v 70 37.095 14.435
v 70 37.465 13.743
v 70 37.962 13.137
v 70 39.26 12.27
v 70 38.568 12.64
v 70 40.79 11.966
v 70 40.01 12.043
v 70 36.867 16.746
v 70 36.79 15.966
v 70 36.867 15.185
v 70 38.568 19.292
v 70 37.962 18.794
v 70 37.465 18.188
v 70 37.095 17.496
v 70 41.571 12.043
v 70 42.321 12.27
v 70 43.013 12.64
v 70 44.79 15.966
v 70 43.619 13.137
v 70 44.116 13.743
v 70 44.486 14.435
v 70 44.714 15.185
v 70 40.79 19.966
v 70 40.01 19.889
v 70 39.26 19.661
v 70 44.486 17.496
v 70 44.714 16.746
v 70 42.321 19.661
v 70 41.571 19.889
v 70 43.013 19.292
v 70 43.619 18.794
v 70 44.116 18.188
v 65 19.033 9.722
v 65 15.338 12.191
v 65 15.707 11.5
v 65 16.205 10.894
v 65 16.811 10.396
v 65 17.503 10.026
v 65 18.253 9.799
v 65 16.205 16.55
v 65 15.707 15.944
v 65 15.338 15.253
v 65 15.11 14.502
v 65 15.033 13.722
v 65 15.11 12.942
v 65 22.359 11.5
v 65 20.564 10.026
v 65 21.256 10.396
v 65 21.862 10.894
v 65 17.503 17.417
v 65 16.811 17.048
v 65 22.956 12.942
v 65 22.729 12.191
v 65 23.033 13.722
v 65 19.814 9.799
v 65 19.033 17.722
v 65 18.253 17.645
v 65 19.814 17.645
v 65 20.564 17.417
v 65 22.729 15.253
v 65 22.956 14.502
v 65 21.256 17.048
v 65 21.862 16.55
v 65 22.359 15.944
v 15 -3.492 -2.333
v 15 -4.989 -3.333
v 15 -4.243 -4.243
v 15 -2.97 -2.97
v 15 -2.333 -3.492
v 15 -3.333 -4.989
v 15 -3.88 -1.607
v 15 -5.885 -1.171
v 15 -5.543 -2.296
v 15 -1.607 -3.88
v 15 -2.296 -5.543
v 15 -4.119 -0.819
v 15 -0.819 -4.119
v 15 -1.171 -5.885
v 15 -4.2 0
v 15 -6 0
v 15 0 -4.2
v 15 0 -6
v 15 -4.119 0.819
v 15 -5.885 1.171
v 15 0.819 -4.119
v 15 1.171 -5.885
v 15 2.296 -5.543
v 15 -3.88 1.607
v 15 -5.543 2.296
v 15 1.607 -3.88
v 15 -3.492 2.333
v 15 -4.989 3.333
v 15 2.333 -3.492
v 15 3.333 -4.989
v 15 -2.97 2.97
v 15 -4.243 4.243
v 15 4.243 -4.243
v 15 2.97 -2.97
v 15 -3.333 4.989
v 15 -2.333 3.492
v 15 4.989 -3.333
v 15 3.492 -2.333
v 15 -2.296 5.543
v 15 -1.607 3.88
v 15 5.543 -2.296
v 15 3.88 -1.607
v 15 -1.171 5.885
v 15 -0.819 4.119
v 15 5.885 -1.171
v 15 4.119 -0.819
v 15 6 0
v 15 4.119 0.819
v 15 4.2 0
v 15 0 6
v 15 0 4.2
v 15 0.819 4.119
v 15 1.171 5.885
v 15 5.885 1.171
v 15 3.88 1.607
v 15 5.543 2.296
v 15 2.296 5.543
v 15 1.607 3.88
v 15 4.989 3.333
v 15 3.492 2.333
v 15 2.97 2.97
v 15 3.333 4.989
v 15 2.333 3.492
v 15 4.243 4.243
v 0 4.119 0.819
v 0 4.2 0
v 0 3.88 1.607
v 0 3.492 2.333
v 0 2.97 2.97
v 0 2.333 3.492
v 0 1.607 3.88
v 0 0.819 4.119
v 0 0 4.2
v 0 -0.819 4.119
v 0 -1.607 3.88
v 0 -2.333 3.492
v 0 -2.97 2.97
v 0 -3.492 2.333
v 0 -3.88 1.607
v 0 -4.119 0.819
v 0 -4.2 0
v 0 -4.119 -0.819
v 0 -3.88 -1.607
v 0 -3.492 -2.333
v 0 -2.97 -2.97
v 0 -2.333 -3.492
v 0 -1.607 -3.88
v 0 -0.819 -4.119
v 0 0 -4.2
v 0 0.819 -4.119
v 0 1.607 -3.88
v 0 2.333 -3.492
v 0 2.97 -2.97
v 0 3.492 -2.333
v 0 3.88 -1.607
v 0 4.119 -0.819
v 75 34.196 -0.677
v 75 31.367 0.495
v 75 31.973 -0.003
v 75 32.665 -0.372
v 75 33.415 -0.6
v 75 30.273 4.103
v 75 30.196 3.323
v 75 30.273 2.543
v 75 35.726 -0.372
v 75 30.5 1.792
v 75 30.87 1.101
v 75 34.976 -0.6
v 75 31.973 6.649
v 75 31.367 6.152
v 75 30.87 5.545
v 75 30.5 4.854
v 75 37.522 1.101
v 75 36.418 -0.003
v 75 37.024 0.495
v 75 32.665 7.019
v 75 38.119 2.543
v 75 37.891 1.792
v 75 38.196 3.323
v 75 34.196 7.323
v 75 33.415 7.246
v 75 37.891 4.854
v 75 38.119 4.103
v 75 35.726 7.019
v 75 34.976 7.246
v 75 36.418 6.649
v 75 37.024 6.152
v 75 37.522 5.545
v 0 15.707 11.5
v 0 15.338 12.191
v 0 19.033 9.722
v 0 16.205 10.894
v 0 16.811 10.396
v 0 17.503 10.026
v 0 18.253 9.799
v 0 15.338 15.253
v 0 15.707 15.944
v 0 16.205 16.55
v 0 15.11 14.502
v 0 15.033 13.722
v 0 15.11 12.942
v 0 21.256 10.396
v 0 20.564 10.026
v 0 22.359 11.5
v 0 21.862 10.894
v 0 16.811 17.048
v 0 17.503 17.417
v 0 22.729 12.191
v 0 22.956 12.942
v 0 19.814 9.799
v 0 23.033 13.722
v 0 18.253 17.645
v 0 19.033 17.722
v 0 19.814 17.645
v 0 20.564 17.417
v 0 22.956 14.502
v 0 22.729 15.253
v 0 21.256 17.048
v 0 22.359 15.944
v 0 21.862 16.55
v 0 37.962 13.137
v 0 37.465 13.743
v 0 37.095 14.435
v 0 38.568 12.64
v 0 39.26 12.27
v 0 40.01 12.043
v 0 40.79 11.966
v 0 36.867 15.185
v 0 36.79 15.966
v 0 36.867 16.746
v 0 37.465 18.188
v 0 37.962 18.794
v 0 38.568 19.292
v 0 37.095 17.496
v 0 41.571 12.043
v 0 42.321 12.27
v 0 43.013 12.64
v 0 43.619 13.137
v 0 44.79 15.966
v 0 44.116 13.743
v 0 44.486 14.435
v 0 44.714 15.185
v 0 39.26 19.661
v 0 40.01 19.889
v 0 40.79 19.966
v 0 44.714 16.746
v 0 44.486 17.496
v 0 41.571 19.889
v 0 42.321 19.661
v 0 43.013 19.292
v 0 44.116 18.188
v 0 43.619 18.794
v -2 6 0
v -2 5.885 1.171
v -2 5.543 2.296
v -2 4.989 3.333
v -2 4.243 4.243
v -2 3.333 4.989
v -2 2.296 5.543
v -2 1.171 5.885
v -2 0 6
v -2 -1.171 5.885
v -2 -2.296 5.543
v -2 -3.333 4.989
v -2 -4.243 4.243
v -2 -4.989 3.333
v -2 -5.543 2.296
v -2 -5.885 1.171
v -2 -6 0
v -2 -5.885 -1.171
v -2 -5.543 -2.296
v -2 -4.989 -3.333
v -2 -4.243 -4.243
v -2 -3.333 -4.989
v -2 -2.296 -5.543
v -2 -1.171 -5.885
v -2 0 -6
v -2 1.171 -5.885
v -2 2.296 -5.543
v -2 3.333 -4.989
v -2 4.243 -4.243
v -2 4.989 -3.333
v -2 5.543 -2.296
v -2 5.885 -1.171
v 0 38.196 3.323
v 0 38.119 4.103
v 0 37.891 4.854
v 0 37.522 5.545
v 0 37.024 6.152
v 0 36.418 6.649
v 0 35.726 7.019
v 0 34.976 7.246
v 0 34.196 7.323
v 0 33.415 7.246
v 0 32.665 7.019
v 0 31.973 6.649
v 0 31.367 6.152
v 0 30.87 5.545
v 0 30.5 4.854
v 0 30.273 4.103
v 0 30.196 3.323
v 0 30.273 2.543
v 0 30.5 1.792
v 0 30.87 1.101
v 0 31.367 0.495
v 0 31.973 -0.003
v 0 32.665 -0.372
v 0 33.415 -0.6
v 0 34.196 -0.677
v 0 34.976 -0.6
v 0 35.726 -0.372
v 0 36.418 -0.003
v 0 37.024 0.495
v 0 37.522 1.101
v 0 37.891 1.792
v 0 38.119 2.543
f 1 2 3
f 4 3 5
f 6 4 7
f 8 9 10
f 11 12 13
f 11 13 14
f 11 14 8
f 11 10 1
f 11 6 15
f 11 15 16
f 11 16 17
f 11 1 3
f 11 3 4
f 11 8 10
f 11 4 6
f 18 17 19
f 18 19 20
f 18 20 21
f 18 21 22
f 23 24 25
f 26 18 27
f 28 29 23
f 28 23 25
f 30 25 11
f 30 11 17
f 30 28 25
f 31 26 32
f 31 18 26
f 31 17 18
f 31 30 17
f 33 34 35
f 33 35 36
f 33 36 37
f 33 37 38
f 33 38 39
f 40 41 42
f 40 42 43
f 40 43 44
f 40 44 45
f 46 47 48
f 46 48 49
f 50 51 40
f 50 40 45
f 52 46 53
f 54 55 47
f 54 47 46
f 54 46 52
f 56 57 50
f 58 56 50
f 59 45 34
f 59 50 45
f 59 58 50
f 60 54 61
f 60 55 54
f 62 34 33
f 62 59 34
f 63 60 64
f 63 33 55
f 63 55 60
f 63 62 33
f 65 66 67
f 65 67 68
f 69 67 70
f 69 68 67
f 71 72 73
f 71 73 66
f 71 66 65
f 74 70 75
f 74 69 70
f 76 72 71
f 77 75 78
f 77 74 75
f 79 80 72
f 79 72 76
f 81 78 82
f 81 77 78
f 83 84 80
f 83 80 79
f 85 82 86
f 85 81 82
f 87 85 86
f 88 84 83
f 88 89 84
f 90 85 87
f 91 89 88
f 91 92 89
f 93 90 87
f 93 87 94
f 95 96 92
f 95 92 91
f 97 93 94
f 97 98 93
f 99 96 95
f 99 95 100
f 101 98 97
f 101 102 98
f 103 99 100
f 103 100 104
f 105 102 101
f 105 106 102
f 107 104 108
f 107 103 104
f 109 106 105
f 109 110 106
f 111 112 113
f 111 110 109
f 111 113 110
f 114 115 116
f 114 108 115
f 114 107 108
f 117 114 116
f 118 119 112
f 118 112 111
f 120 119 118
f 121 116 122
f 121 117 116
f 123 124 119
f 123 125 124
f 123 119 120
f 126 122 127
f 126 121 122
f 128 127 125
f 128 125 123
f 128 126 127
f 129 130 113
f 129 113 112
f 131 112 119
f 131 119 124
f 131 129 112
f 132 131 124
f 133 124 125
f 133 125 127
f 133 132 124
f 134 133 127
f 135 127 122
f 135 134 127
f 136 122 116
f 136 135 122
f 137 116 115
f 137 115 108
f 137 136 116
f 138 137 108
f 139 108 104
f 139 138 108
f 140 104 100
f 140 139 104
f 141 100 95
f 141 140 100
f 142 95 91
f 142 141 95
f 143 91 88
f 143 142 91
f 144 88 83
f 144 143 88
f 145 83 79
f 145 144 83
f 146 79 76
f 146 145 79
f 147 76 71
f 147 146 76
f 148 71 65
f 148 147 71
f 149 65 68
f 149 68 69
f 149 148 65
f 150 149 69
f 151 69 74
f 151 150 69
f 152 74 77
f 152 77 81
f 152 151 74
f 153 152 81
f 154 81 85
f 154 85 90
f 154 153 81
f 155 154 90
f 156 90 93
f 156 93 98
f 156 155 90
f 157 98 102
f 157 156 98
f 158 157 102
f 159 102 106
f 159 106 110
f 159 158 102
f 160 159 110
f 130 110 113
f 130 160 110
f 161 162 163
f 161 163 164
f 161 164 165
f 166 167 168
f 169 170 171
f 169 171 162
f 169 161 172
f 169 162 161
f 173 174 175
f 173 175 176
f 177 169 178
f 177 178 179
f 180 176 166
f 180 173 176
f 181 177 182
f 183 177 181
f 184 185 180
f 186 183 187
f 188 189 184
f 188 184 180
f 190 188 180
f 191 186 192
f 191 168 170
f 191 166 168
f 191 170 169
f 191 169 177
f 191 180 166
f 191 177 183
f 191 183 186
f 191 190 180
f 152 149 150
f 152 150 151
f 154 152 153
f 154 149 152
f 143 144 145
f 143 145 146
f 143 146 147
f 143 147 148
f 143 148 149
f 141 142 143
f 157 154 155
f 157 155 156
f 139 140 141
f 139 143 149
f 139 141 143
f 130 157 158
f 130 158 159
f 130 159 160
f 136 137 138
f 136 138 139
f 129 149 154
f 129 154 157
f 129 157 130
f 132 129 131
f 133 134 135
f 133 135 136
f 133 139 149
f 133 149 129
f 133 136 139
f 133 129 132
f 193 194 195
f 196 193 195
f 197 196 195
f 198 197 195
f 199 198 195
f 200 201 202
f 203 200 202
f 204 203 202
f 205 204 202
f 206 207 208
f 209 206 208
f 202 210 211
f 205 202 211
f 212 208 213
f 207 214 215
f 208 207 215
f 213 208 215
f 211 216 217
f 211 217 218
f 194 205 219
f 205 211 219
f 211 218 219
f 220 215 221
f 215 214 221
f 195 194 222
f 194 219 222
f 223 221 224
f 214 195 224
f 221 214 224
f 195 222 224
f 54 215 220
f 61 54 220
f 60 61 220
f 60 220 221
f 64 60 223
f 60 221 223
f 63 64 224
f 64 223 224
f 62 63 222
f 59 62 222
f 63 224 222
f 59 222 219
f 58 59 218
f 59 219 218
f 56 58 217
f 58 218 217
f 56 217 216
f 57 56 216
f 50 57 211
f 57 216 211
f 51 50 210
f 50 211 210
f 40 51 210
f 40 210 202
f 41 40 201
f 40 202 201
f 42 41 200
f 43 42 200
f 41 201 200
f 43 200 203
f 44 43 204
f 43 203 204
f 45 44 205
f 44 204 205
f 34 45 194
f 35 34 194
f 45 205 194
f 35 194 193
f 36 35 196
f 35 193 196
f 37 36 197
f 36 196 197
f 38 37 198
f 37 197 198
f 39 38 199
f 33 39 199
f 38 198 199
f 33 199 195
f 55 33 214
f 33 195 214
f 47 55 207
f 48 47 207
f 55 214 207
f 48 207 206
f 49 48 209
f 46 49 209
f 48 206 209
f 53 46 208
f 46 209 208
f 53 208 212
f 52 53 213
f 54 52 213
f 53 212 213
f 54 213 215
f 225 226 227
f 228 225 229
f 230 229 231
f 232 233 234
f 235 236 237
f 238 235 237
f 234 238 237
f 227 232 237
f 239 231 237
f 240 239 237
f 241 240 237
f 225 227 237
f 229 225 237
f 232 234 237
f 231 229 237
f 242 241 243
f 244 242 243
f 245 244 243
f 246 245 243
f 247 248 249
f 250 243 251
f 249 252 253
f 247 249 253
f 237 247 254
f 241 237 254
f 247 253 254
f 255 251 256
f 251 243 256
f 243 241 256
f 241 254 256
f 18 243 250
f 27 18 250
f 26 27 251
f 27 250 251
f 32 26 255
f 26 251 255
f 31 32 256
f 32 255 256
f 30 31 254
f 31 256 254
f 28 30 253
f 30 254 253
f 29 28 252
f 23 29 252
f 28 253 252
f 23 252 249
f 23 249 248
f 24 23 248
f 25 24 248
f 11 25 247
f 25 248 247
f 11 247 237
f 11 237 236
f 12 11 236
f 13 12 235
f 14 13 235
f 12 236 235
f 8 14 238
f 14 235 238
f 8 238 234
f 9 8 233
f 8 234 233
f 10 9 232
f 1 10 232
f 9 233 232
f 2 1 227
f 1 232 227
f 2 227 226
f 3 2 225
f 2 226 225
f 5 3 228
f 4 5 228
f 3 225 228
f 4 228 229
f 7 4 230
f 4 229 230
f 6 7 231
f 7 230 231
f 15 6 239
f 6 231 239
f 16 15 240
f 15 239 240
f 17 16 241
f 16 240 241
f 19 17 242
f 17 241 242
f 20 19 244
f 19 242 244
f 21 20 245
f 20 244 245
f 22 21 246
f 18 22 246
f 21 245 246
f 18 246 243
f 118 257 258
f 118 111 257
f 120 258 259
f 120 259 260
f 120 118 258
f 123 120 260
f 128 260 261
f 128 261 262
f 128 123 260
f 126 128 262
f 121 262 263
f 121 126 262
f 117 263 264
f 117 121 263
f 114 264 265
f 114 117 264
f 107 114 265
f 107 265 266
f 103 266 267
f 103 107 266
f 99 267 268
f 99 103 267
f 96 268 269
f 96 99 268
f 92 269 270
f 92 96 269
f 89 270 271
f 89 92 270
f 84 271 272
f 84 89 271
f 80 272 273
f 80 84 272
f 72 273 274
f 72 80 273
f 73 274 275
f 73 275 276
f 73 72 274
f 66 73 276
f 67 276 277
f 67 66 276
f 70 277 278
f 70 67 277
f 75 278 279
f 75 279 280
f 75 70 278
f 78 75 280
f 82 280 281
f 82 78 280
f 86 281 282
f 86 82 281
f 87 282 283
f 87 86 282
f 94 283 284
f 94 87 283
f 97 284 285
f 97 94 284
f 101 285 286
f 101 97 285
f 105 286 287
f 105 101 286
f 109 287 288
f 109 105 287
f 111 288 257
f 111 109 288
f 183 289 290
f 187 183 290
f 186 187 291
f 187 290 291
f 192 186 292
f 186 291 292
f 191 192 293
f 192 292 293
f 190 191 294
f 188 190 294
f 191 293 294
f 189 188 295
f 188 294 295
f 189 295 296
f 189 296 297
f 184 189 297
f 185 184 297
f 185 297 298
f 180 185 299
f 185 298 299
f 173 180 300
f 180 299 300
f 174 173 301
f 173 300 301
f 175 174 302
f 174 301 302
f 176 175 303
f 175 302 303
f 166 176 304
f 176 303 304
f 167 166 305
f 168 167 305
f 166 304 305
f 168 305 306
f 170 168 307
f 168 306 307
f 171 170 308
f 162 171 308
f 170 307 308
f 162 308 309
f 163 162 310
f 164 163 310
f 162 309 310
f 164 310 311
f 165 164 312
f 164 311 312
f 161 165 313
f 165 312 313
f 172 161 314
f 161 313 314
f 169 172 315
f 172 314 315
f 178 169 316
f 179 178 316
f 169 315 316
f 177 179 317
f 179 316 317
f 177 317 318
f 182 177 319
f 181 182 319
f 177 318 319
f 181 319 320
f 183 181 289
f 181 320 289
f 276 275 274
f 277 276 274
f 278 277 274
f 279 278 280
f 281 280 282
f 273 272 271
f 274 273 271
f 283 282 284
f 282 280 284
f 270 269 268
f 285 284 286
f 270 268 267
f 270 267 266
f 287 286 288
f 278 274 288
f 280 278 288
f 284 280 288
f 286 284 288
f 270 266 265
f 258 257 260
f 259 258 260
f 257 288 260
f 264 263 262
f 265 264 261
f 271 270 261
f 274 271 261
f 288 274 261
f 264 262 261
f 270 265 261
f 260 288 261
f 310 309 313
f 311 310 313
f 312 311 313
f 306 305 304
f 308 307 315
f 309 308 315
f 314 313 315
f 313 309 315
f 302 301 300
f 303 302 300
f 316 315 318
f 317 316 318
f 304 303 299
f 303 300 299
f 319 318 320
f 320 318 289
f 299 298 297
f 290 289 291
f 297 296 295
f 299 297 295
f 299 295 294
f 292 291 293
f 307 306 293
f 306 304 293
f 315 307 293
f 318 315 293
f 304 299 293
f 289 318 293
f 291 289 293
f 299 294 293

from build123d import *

# Parameters (mm, degrees)
F0_R     = 6
F0_R_2   = 4.2
F1_DEPTH = 15
F2_DEPTH = 2
F0_R_3   = 4
F3_DEPTH = 75
F4_DEPTH = 65
F5_DEPTH = 70


with BuildPart() as f1:
    # F0 (on Right) → F1 (new body)
    with BuildSketch(Plane.YZ):
        Circle(F0_R)
        Circle(F0_R_2, mode=Mode.SUBTRACT)
    extrude(amount=F1_DEPTH)

    # F0 (on Right) → F2 (join)
    with BuildSketch(Plane.YZ):
        Circle(F0_R)
        Circle(F0_R_2, mode=Mode.SUBTRACT)
        Circle(F0_R_2)
    extrude(amount=-F2_DEPTH)


with BuildPart() as f3:
    # F0 (on Right) → F3 (new body)
    with BuildSketch(Plane.YZ):
        with Locations((34.1957472265, 3.3231009729)):
            Circle(F0_R_3)
    extrude(amount=F3_DEPTH)


with BuildPart() as f4:
    # F0 (on Right) → F4 (new body)
    with BuildSketch(Plane.YZ):
        with Locations((19.0332792699, 13.7219512835)):
            Circle(F0_R_3)
    extrude(amount=F4_DEPTH)


with BuildPart() as f5:
    # F0 (on Right) → F5 (new body)
    with BuildSketch(Plane.YZ):
        with Locations((40.790412575, 15.9656554461)):
            Circle(F0_R_3)
    extrude(amount=F5_DEPTH)


solid = Compound([f1.part, f3.part, f4.part, f5.part])
